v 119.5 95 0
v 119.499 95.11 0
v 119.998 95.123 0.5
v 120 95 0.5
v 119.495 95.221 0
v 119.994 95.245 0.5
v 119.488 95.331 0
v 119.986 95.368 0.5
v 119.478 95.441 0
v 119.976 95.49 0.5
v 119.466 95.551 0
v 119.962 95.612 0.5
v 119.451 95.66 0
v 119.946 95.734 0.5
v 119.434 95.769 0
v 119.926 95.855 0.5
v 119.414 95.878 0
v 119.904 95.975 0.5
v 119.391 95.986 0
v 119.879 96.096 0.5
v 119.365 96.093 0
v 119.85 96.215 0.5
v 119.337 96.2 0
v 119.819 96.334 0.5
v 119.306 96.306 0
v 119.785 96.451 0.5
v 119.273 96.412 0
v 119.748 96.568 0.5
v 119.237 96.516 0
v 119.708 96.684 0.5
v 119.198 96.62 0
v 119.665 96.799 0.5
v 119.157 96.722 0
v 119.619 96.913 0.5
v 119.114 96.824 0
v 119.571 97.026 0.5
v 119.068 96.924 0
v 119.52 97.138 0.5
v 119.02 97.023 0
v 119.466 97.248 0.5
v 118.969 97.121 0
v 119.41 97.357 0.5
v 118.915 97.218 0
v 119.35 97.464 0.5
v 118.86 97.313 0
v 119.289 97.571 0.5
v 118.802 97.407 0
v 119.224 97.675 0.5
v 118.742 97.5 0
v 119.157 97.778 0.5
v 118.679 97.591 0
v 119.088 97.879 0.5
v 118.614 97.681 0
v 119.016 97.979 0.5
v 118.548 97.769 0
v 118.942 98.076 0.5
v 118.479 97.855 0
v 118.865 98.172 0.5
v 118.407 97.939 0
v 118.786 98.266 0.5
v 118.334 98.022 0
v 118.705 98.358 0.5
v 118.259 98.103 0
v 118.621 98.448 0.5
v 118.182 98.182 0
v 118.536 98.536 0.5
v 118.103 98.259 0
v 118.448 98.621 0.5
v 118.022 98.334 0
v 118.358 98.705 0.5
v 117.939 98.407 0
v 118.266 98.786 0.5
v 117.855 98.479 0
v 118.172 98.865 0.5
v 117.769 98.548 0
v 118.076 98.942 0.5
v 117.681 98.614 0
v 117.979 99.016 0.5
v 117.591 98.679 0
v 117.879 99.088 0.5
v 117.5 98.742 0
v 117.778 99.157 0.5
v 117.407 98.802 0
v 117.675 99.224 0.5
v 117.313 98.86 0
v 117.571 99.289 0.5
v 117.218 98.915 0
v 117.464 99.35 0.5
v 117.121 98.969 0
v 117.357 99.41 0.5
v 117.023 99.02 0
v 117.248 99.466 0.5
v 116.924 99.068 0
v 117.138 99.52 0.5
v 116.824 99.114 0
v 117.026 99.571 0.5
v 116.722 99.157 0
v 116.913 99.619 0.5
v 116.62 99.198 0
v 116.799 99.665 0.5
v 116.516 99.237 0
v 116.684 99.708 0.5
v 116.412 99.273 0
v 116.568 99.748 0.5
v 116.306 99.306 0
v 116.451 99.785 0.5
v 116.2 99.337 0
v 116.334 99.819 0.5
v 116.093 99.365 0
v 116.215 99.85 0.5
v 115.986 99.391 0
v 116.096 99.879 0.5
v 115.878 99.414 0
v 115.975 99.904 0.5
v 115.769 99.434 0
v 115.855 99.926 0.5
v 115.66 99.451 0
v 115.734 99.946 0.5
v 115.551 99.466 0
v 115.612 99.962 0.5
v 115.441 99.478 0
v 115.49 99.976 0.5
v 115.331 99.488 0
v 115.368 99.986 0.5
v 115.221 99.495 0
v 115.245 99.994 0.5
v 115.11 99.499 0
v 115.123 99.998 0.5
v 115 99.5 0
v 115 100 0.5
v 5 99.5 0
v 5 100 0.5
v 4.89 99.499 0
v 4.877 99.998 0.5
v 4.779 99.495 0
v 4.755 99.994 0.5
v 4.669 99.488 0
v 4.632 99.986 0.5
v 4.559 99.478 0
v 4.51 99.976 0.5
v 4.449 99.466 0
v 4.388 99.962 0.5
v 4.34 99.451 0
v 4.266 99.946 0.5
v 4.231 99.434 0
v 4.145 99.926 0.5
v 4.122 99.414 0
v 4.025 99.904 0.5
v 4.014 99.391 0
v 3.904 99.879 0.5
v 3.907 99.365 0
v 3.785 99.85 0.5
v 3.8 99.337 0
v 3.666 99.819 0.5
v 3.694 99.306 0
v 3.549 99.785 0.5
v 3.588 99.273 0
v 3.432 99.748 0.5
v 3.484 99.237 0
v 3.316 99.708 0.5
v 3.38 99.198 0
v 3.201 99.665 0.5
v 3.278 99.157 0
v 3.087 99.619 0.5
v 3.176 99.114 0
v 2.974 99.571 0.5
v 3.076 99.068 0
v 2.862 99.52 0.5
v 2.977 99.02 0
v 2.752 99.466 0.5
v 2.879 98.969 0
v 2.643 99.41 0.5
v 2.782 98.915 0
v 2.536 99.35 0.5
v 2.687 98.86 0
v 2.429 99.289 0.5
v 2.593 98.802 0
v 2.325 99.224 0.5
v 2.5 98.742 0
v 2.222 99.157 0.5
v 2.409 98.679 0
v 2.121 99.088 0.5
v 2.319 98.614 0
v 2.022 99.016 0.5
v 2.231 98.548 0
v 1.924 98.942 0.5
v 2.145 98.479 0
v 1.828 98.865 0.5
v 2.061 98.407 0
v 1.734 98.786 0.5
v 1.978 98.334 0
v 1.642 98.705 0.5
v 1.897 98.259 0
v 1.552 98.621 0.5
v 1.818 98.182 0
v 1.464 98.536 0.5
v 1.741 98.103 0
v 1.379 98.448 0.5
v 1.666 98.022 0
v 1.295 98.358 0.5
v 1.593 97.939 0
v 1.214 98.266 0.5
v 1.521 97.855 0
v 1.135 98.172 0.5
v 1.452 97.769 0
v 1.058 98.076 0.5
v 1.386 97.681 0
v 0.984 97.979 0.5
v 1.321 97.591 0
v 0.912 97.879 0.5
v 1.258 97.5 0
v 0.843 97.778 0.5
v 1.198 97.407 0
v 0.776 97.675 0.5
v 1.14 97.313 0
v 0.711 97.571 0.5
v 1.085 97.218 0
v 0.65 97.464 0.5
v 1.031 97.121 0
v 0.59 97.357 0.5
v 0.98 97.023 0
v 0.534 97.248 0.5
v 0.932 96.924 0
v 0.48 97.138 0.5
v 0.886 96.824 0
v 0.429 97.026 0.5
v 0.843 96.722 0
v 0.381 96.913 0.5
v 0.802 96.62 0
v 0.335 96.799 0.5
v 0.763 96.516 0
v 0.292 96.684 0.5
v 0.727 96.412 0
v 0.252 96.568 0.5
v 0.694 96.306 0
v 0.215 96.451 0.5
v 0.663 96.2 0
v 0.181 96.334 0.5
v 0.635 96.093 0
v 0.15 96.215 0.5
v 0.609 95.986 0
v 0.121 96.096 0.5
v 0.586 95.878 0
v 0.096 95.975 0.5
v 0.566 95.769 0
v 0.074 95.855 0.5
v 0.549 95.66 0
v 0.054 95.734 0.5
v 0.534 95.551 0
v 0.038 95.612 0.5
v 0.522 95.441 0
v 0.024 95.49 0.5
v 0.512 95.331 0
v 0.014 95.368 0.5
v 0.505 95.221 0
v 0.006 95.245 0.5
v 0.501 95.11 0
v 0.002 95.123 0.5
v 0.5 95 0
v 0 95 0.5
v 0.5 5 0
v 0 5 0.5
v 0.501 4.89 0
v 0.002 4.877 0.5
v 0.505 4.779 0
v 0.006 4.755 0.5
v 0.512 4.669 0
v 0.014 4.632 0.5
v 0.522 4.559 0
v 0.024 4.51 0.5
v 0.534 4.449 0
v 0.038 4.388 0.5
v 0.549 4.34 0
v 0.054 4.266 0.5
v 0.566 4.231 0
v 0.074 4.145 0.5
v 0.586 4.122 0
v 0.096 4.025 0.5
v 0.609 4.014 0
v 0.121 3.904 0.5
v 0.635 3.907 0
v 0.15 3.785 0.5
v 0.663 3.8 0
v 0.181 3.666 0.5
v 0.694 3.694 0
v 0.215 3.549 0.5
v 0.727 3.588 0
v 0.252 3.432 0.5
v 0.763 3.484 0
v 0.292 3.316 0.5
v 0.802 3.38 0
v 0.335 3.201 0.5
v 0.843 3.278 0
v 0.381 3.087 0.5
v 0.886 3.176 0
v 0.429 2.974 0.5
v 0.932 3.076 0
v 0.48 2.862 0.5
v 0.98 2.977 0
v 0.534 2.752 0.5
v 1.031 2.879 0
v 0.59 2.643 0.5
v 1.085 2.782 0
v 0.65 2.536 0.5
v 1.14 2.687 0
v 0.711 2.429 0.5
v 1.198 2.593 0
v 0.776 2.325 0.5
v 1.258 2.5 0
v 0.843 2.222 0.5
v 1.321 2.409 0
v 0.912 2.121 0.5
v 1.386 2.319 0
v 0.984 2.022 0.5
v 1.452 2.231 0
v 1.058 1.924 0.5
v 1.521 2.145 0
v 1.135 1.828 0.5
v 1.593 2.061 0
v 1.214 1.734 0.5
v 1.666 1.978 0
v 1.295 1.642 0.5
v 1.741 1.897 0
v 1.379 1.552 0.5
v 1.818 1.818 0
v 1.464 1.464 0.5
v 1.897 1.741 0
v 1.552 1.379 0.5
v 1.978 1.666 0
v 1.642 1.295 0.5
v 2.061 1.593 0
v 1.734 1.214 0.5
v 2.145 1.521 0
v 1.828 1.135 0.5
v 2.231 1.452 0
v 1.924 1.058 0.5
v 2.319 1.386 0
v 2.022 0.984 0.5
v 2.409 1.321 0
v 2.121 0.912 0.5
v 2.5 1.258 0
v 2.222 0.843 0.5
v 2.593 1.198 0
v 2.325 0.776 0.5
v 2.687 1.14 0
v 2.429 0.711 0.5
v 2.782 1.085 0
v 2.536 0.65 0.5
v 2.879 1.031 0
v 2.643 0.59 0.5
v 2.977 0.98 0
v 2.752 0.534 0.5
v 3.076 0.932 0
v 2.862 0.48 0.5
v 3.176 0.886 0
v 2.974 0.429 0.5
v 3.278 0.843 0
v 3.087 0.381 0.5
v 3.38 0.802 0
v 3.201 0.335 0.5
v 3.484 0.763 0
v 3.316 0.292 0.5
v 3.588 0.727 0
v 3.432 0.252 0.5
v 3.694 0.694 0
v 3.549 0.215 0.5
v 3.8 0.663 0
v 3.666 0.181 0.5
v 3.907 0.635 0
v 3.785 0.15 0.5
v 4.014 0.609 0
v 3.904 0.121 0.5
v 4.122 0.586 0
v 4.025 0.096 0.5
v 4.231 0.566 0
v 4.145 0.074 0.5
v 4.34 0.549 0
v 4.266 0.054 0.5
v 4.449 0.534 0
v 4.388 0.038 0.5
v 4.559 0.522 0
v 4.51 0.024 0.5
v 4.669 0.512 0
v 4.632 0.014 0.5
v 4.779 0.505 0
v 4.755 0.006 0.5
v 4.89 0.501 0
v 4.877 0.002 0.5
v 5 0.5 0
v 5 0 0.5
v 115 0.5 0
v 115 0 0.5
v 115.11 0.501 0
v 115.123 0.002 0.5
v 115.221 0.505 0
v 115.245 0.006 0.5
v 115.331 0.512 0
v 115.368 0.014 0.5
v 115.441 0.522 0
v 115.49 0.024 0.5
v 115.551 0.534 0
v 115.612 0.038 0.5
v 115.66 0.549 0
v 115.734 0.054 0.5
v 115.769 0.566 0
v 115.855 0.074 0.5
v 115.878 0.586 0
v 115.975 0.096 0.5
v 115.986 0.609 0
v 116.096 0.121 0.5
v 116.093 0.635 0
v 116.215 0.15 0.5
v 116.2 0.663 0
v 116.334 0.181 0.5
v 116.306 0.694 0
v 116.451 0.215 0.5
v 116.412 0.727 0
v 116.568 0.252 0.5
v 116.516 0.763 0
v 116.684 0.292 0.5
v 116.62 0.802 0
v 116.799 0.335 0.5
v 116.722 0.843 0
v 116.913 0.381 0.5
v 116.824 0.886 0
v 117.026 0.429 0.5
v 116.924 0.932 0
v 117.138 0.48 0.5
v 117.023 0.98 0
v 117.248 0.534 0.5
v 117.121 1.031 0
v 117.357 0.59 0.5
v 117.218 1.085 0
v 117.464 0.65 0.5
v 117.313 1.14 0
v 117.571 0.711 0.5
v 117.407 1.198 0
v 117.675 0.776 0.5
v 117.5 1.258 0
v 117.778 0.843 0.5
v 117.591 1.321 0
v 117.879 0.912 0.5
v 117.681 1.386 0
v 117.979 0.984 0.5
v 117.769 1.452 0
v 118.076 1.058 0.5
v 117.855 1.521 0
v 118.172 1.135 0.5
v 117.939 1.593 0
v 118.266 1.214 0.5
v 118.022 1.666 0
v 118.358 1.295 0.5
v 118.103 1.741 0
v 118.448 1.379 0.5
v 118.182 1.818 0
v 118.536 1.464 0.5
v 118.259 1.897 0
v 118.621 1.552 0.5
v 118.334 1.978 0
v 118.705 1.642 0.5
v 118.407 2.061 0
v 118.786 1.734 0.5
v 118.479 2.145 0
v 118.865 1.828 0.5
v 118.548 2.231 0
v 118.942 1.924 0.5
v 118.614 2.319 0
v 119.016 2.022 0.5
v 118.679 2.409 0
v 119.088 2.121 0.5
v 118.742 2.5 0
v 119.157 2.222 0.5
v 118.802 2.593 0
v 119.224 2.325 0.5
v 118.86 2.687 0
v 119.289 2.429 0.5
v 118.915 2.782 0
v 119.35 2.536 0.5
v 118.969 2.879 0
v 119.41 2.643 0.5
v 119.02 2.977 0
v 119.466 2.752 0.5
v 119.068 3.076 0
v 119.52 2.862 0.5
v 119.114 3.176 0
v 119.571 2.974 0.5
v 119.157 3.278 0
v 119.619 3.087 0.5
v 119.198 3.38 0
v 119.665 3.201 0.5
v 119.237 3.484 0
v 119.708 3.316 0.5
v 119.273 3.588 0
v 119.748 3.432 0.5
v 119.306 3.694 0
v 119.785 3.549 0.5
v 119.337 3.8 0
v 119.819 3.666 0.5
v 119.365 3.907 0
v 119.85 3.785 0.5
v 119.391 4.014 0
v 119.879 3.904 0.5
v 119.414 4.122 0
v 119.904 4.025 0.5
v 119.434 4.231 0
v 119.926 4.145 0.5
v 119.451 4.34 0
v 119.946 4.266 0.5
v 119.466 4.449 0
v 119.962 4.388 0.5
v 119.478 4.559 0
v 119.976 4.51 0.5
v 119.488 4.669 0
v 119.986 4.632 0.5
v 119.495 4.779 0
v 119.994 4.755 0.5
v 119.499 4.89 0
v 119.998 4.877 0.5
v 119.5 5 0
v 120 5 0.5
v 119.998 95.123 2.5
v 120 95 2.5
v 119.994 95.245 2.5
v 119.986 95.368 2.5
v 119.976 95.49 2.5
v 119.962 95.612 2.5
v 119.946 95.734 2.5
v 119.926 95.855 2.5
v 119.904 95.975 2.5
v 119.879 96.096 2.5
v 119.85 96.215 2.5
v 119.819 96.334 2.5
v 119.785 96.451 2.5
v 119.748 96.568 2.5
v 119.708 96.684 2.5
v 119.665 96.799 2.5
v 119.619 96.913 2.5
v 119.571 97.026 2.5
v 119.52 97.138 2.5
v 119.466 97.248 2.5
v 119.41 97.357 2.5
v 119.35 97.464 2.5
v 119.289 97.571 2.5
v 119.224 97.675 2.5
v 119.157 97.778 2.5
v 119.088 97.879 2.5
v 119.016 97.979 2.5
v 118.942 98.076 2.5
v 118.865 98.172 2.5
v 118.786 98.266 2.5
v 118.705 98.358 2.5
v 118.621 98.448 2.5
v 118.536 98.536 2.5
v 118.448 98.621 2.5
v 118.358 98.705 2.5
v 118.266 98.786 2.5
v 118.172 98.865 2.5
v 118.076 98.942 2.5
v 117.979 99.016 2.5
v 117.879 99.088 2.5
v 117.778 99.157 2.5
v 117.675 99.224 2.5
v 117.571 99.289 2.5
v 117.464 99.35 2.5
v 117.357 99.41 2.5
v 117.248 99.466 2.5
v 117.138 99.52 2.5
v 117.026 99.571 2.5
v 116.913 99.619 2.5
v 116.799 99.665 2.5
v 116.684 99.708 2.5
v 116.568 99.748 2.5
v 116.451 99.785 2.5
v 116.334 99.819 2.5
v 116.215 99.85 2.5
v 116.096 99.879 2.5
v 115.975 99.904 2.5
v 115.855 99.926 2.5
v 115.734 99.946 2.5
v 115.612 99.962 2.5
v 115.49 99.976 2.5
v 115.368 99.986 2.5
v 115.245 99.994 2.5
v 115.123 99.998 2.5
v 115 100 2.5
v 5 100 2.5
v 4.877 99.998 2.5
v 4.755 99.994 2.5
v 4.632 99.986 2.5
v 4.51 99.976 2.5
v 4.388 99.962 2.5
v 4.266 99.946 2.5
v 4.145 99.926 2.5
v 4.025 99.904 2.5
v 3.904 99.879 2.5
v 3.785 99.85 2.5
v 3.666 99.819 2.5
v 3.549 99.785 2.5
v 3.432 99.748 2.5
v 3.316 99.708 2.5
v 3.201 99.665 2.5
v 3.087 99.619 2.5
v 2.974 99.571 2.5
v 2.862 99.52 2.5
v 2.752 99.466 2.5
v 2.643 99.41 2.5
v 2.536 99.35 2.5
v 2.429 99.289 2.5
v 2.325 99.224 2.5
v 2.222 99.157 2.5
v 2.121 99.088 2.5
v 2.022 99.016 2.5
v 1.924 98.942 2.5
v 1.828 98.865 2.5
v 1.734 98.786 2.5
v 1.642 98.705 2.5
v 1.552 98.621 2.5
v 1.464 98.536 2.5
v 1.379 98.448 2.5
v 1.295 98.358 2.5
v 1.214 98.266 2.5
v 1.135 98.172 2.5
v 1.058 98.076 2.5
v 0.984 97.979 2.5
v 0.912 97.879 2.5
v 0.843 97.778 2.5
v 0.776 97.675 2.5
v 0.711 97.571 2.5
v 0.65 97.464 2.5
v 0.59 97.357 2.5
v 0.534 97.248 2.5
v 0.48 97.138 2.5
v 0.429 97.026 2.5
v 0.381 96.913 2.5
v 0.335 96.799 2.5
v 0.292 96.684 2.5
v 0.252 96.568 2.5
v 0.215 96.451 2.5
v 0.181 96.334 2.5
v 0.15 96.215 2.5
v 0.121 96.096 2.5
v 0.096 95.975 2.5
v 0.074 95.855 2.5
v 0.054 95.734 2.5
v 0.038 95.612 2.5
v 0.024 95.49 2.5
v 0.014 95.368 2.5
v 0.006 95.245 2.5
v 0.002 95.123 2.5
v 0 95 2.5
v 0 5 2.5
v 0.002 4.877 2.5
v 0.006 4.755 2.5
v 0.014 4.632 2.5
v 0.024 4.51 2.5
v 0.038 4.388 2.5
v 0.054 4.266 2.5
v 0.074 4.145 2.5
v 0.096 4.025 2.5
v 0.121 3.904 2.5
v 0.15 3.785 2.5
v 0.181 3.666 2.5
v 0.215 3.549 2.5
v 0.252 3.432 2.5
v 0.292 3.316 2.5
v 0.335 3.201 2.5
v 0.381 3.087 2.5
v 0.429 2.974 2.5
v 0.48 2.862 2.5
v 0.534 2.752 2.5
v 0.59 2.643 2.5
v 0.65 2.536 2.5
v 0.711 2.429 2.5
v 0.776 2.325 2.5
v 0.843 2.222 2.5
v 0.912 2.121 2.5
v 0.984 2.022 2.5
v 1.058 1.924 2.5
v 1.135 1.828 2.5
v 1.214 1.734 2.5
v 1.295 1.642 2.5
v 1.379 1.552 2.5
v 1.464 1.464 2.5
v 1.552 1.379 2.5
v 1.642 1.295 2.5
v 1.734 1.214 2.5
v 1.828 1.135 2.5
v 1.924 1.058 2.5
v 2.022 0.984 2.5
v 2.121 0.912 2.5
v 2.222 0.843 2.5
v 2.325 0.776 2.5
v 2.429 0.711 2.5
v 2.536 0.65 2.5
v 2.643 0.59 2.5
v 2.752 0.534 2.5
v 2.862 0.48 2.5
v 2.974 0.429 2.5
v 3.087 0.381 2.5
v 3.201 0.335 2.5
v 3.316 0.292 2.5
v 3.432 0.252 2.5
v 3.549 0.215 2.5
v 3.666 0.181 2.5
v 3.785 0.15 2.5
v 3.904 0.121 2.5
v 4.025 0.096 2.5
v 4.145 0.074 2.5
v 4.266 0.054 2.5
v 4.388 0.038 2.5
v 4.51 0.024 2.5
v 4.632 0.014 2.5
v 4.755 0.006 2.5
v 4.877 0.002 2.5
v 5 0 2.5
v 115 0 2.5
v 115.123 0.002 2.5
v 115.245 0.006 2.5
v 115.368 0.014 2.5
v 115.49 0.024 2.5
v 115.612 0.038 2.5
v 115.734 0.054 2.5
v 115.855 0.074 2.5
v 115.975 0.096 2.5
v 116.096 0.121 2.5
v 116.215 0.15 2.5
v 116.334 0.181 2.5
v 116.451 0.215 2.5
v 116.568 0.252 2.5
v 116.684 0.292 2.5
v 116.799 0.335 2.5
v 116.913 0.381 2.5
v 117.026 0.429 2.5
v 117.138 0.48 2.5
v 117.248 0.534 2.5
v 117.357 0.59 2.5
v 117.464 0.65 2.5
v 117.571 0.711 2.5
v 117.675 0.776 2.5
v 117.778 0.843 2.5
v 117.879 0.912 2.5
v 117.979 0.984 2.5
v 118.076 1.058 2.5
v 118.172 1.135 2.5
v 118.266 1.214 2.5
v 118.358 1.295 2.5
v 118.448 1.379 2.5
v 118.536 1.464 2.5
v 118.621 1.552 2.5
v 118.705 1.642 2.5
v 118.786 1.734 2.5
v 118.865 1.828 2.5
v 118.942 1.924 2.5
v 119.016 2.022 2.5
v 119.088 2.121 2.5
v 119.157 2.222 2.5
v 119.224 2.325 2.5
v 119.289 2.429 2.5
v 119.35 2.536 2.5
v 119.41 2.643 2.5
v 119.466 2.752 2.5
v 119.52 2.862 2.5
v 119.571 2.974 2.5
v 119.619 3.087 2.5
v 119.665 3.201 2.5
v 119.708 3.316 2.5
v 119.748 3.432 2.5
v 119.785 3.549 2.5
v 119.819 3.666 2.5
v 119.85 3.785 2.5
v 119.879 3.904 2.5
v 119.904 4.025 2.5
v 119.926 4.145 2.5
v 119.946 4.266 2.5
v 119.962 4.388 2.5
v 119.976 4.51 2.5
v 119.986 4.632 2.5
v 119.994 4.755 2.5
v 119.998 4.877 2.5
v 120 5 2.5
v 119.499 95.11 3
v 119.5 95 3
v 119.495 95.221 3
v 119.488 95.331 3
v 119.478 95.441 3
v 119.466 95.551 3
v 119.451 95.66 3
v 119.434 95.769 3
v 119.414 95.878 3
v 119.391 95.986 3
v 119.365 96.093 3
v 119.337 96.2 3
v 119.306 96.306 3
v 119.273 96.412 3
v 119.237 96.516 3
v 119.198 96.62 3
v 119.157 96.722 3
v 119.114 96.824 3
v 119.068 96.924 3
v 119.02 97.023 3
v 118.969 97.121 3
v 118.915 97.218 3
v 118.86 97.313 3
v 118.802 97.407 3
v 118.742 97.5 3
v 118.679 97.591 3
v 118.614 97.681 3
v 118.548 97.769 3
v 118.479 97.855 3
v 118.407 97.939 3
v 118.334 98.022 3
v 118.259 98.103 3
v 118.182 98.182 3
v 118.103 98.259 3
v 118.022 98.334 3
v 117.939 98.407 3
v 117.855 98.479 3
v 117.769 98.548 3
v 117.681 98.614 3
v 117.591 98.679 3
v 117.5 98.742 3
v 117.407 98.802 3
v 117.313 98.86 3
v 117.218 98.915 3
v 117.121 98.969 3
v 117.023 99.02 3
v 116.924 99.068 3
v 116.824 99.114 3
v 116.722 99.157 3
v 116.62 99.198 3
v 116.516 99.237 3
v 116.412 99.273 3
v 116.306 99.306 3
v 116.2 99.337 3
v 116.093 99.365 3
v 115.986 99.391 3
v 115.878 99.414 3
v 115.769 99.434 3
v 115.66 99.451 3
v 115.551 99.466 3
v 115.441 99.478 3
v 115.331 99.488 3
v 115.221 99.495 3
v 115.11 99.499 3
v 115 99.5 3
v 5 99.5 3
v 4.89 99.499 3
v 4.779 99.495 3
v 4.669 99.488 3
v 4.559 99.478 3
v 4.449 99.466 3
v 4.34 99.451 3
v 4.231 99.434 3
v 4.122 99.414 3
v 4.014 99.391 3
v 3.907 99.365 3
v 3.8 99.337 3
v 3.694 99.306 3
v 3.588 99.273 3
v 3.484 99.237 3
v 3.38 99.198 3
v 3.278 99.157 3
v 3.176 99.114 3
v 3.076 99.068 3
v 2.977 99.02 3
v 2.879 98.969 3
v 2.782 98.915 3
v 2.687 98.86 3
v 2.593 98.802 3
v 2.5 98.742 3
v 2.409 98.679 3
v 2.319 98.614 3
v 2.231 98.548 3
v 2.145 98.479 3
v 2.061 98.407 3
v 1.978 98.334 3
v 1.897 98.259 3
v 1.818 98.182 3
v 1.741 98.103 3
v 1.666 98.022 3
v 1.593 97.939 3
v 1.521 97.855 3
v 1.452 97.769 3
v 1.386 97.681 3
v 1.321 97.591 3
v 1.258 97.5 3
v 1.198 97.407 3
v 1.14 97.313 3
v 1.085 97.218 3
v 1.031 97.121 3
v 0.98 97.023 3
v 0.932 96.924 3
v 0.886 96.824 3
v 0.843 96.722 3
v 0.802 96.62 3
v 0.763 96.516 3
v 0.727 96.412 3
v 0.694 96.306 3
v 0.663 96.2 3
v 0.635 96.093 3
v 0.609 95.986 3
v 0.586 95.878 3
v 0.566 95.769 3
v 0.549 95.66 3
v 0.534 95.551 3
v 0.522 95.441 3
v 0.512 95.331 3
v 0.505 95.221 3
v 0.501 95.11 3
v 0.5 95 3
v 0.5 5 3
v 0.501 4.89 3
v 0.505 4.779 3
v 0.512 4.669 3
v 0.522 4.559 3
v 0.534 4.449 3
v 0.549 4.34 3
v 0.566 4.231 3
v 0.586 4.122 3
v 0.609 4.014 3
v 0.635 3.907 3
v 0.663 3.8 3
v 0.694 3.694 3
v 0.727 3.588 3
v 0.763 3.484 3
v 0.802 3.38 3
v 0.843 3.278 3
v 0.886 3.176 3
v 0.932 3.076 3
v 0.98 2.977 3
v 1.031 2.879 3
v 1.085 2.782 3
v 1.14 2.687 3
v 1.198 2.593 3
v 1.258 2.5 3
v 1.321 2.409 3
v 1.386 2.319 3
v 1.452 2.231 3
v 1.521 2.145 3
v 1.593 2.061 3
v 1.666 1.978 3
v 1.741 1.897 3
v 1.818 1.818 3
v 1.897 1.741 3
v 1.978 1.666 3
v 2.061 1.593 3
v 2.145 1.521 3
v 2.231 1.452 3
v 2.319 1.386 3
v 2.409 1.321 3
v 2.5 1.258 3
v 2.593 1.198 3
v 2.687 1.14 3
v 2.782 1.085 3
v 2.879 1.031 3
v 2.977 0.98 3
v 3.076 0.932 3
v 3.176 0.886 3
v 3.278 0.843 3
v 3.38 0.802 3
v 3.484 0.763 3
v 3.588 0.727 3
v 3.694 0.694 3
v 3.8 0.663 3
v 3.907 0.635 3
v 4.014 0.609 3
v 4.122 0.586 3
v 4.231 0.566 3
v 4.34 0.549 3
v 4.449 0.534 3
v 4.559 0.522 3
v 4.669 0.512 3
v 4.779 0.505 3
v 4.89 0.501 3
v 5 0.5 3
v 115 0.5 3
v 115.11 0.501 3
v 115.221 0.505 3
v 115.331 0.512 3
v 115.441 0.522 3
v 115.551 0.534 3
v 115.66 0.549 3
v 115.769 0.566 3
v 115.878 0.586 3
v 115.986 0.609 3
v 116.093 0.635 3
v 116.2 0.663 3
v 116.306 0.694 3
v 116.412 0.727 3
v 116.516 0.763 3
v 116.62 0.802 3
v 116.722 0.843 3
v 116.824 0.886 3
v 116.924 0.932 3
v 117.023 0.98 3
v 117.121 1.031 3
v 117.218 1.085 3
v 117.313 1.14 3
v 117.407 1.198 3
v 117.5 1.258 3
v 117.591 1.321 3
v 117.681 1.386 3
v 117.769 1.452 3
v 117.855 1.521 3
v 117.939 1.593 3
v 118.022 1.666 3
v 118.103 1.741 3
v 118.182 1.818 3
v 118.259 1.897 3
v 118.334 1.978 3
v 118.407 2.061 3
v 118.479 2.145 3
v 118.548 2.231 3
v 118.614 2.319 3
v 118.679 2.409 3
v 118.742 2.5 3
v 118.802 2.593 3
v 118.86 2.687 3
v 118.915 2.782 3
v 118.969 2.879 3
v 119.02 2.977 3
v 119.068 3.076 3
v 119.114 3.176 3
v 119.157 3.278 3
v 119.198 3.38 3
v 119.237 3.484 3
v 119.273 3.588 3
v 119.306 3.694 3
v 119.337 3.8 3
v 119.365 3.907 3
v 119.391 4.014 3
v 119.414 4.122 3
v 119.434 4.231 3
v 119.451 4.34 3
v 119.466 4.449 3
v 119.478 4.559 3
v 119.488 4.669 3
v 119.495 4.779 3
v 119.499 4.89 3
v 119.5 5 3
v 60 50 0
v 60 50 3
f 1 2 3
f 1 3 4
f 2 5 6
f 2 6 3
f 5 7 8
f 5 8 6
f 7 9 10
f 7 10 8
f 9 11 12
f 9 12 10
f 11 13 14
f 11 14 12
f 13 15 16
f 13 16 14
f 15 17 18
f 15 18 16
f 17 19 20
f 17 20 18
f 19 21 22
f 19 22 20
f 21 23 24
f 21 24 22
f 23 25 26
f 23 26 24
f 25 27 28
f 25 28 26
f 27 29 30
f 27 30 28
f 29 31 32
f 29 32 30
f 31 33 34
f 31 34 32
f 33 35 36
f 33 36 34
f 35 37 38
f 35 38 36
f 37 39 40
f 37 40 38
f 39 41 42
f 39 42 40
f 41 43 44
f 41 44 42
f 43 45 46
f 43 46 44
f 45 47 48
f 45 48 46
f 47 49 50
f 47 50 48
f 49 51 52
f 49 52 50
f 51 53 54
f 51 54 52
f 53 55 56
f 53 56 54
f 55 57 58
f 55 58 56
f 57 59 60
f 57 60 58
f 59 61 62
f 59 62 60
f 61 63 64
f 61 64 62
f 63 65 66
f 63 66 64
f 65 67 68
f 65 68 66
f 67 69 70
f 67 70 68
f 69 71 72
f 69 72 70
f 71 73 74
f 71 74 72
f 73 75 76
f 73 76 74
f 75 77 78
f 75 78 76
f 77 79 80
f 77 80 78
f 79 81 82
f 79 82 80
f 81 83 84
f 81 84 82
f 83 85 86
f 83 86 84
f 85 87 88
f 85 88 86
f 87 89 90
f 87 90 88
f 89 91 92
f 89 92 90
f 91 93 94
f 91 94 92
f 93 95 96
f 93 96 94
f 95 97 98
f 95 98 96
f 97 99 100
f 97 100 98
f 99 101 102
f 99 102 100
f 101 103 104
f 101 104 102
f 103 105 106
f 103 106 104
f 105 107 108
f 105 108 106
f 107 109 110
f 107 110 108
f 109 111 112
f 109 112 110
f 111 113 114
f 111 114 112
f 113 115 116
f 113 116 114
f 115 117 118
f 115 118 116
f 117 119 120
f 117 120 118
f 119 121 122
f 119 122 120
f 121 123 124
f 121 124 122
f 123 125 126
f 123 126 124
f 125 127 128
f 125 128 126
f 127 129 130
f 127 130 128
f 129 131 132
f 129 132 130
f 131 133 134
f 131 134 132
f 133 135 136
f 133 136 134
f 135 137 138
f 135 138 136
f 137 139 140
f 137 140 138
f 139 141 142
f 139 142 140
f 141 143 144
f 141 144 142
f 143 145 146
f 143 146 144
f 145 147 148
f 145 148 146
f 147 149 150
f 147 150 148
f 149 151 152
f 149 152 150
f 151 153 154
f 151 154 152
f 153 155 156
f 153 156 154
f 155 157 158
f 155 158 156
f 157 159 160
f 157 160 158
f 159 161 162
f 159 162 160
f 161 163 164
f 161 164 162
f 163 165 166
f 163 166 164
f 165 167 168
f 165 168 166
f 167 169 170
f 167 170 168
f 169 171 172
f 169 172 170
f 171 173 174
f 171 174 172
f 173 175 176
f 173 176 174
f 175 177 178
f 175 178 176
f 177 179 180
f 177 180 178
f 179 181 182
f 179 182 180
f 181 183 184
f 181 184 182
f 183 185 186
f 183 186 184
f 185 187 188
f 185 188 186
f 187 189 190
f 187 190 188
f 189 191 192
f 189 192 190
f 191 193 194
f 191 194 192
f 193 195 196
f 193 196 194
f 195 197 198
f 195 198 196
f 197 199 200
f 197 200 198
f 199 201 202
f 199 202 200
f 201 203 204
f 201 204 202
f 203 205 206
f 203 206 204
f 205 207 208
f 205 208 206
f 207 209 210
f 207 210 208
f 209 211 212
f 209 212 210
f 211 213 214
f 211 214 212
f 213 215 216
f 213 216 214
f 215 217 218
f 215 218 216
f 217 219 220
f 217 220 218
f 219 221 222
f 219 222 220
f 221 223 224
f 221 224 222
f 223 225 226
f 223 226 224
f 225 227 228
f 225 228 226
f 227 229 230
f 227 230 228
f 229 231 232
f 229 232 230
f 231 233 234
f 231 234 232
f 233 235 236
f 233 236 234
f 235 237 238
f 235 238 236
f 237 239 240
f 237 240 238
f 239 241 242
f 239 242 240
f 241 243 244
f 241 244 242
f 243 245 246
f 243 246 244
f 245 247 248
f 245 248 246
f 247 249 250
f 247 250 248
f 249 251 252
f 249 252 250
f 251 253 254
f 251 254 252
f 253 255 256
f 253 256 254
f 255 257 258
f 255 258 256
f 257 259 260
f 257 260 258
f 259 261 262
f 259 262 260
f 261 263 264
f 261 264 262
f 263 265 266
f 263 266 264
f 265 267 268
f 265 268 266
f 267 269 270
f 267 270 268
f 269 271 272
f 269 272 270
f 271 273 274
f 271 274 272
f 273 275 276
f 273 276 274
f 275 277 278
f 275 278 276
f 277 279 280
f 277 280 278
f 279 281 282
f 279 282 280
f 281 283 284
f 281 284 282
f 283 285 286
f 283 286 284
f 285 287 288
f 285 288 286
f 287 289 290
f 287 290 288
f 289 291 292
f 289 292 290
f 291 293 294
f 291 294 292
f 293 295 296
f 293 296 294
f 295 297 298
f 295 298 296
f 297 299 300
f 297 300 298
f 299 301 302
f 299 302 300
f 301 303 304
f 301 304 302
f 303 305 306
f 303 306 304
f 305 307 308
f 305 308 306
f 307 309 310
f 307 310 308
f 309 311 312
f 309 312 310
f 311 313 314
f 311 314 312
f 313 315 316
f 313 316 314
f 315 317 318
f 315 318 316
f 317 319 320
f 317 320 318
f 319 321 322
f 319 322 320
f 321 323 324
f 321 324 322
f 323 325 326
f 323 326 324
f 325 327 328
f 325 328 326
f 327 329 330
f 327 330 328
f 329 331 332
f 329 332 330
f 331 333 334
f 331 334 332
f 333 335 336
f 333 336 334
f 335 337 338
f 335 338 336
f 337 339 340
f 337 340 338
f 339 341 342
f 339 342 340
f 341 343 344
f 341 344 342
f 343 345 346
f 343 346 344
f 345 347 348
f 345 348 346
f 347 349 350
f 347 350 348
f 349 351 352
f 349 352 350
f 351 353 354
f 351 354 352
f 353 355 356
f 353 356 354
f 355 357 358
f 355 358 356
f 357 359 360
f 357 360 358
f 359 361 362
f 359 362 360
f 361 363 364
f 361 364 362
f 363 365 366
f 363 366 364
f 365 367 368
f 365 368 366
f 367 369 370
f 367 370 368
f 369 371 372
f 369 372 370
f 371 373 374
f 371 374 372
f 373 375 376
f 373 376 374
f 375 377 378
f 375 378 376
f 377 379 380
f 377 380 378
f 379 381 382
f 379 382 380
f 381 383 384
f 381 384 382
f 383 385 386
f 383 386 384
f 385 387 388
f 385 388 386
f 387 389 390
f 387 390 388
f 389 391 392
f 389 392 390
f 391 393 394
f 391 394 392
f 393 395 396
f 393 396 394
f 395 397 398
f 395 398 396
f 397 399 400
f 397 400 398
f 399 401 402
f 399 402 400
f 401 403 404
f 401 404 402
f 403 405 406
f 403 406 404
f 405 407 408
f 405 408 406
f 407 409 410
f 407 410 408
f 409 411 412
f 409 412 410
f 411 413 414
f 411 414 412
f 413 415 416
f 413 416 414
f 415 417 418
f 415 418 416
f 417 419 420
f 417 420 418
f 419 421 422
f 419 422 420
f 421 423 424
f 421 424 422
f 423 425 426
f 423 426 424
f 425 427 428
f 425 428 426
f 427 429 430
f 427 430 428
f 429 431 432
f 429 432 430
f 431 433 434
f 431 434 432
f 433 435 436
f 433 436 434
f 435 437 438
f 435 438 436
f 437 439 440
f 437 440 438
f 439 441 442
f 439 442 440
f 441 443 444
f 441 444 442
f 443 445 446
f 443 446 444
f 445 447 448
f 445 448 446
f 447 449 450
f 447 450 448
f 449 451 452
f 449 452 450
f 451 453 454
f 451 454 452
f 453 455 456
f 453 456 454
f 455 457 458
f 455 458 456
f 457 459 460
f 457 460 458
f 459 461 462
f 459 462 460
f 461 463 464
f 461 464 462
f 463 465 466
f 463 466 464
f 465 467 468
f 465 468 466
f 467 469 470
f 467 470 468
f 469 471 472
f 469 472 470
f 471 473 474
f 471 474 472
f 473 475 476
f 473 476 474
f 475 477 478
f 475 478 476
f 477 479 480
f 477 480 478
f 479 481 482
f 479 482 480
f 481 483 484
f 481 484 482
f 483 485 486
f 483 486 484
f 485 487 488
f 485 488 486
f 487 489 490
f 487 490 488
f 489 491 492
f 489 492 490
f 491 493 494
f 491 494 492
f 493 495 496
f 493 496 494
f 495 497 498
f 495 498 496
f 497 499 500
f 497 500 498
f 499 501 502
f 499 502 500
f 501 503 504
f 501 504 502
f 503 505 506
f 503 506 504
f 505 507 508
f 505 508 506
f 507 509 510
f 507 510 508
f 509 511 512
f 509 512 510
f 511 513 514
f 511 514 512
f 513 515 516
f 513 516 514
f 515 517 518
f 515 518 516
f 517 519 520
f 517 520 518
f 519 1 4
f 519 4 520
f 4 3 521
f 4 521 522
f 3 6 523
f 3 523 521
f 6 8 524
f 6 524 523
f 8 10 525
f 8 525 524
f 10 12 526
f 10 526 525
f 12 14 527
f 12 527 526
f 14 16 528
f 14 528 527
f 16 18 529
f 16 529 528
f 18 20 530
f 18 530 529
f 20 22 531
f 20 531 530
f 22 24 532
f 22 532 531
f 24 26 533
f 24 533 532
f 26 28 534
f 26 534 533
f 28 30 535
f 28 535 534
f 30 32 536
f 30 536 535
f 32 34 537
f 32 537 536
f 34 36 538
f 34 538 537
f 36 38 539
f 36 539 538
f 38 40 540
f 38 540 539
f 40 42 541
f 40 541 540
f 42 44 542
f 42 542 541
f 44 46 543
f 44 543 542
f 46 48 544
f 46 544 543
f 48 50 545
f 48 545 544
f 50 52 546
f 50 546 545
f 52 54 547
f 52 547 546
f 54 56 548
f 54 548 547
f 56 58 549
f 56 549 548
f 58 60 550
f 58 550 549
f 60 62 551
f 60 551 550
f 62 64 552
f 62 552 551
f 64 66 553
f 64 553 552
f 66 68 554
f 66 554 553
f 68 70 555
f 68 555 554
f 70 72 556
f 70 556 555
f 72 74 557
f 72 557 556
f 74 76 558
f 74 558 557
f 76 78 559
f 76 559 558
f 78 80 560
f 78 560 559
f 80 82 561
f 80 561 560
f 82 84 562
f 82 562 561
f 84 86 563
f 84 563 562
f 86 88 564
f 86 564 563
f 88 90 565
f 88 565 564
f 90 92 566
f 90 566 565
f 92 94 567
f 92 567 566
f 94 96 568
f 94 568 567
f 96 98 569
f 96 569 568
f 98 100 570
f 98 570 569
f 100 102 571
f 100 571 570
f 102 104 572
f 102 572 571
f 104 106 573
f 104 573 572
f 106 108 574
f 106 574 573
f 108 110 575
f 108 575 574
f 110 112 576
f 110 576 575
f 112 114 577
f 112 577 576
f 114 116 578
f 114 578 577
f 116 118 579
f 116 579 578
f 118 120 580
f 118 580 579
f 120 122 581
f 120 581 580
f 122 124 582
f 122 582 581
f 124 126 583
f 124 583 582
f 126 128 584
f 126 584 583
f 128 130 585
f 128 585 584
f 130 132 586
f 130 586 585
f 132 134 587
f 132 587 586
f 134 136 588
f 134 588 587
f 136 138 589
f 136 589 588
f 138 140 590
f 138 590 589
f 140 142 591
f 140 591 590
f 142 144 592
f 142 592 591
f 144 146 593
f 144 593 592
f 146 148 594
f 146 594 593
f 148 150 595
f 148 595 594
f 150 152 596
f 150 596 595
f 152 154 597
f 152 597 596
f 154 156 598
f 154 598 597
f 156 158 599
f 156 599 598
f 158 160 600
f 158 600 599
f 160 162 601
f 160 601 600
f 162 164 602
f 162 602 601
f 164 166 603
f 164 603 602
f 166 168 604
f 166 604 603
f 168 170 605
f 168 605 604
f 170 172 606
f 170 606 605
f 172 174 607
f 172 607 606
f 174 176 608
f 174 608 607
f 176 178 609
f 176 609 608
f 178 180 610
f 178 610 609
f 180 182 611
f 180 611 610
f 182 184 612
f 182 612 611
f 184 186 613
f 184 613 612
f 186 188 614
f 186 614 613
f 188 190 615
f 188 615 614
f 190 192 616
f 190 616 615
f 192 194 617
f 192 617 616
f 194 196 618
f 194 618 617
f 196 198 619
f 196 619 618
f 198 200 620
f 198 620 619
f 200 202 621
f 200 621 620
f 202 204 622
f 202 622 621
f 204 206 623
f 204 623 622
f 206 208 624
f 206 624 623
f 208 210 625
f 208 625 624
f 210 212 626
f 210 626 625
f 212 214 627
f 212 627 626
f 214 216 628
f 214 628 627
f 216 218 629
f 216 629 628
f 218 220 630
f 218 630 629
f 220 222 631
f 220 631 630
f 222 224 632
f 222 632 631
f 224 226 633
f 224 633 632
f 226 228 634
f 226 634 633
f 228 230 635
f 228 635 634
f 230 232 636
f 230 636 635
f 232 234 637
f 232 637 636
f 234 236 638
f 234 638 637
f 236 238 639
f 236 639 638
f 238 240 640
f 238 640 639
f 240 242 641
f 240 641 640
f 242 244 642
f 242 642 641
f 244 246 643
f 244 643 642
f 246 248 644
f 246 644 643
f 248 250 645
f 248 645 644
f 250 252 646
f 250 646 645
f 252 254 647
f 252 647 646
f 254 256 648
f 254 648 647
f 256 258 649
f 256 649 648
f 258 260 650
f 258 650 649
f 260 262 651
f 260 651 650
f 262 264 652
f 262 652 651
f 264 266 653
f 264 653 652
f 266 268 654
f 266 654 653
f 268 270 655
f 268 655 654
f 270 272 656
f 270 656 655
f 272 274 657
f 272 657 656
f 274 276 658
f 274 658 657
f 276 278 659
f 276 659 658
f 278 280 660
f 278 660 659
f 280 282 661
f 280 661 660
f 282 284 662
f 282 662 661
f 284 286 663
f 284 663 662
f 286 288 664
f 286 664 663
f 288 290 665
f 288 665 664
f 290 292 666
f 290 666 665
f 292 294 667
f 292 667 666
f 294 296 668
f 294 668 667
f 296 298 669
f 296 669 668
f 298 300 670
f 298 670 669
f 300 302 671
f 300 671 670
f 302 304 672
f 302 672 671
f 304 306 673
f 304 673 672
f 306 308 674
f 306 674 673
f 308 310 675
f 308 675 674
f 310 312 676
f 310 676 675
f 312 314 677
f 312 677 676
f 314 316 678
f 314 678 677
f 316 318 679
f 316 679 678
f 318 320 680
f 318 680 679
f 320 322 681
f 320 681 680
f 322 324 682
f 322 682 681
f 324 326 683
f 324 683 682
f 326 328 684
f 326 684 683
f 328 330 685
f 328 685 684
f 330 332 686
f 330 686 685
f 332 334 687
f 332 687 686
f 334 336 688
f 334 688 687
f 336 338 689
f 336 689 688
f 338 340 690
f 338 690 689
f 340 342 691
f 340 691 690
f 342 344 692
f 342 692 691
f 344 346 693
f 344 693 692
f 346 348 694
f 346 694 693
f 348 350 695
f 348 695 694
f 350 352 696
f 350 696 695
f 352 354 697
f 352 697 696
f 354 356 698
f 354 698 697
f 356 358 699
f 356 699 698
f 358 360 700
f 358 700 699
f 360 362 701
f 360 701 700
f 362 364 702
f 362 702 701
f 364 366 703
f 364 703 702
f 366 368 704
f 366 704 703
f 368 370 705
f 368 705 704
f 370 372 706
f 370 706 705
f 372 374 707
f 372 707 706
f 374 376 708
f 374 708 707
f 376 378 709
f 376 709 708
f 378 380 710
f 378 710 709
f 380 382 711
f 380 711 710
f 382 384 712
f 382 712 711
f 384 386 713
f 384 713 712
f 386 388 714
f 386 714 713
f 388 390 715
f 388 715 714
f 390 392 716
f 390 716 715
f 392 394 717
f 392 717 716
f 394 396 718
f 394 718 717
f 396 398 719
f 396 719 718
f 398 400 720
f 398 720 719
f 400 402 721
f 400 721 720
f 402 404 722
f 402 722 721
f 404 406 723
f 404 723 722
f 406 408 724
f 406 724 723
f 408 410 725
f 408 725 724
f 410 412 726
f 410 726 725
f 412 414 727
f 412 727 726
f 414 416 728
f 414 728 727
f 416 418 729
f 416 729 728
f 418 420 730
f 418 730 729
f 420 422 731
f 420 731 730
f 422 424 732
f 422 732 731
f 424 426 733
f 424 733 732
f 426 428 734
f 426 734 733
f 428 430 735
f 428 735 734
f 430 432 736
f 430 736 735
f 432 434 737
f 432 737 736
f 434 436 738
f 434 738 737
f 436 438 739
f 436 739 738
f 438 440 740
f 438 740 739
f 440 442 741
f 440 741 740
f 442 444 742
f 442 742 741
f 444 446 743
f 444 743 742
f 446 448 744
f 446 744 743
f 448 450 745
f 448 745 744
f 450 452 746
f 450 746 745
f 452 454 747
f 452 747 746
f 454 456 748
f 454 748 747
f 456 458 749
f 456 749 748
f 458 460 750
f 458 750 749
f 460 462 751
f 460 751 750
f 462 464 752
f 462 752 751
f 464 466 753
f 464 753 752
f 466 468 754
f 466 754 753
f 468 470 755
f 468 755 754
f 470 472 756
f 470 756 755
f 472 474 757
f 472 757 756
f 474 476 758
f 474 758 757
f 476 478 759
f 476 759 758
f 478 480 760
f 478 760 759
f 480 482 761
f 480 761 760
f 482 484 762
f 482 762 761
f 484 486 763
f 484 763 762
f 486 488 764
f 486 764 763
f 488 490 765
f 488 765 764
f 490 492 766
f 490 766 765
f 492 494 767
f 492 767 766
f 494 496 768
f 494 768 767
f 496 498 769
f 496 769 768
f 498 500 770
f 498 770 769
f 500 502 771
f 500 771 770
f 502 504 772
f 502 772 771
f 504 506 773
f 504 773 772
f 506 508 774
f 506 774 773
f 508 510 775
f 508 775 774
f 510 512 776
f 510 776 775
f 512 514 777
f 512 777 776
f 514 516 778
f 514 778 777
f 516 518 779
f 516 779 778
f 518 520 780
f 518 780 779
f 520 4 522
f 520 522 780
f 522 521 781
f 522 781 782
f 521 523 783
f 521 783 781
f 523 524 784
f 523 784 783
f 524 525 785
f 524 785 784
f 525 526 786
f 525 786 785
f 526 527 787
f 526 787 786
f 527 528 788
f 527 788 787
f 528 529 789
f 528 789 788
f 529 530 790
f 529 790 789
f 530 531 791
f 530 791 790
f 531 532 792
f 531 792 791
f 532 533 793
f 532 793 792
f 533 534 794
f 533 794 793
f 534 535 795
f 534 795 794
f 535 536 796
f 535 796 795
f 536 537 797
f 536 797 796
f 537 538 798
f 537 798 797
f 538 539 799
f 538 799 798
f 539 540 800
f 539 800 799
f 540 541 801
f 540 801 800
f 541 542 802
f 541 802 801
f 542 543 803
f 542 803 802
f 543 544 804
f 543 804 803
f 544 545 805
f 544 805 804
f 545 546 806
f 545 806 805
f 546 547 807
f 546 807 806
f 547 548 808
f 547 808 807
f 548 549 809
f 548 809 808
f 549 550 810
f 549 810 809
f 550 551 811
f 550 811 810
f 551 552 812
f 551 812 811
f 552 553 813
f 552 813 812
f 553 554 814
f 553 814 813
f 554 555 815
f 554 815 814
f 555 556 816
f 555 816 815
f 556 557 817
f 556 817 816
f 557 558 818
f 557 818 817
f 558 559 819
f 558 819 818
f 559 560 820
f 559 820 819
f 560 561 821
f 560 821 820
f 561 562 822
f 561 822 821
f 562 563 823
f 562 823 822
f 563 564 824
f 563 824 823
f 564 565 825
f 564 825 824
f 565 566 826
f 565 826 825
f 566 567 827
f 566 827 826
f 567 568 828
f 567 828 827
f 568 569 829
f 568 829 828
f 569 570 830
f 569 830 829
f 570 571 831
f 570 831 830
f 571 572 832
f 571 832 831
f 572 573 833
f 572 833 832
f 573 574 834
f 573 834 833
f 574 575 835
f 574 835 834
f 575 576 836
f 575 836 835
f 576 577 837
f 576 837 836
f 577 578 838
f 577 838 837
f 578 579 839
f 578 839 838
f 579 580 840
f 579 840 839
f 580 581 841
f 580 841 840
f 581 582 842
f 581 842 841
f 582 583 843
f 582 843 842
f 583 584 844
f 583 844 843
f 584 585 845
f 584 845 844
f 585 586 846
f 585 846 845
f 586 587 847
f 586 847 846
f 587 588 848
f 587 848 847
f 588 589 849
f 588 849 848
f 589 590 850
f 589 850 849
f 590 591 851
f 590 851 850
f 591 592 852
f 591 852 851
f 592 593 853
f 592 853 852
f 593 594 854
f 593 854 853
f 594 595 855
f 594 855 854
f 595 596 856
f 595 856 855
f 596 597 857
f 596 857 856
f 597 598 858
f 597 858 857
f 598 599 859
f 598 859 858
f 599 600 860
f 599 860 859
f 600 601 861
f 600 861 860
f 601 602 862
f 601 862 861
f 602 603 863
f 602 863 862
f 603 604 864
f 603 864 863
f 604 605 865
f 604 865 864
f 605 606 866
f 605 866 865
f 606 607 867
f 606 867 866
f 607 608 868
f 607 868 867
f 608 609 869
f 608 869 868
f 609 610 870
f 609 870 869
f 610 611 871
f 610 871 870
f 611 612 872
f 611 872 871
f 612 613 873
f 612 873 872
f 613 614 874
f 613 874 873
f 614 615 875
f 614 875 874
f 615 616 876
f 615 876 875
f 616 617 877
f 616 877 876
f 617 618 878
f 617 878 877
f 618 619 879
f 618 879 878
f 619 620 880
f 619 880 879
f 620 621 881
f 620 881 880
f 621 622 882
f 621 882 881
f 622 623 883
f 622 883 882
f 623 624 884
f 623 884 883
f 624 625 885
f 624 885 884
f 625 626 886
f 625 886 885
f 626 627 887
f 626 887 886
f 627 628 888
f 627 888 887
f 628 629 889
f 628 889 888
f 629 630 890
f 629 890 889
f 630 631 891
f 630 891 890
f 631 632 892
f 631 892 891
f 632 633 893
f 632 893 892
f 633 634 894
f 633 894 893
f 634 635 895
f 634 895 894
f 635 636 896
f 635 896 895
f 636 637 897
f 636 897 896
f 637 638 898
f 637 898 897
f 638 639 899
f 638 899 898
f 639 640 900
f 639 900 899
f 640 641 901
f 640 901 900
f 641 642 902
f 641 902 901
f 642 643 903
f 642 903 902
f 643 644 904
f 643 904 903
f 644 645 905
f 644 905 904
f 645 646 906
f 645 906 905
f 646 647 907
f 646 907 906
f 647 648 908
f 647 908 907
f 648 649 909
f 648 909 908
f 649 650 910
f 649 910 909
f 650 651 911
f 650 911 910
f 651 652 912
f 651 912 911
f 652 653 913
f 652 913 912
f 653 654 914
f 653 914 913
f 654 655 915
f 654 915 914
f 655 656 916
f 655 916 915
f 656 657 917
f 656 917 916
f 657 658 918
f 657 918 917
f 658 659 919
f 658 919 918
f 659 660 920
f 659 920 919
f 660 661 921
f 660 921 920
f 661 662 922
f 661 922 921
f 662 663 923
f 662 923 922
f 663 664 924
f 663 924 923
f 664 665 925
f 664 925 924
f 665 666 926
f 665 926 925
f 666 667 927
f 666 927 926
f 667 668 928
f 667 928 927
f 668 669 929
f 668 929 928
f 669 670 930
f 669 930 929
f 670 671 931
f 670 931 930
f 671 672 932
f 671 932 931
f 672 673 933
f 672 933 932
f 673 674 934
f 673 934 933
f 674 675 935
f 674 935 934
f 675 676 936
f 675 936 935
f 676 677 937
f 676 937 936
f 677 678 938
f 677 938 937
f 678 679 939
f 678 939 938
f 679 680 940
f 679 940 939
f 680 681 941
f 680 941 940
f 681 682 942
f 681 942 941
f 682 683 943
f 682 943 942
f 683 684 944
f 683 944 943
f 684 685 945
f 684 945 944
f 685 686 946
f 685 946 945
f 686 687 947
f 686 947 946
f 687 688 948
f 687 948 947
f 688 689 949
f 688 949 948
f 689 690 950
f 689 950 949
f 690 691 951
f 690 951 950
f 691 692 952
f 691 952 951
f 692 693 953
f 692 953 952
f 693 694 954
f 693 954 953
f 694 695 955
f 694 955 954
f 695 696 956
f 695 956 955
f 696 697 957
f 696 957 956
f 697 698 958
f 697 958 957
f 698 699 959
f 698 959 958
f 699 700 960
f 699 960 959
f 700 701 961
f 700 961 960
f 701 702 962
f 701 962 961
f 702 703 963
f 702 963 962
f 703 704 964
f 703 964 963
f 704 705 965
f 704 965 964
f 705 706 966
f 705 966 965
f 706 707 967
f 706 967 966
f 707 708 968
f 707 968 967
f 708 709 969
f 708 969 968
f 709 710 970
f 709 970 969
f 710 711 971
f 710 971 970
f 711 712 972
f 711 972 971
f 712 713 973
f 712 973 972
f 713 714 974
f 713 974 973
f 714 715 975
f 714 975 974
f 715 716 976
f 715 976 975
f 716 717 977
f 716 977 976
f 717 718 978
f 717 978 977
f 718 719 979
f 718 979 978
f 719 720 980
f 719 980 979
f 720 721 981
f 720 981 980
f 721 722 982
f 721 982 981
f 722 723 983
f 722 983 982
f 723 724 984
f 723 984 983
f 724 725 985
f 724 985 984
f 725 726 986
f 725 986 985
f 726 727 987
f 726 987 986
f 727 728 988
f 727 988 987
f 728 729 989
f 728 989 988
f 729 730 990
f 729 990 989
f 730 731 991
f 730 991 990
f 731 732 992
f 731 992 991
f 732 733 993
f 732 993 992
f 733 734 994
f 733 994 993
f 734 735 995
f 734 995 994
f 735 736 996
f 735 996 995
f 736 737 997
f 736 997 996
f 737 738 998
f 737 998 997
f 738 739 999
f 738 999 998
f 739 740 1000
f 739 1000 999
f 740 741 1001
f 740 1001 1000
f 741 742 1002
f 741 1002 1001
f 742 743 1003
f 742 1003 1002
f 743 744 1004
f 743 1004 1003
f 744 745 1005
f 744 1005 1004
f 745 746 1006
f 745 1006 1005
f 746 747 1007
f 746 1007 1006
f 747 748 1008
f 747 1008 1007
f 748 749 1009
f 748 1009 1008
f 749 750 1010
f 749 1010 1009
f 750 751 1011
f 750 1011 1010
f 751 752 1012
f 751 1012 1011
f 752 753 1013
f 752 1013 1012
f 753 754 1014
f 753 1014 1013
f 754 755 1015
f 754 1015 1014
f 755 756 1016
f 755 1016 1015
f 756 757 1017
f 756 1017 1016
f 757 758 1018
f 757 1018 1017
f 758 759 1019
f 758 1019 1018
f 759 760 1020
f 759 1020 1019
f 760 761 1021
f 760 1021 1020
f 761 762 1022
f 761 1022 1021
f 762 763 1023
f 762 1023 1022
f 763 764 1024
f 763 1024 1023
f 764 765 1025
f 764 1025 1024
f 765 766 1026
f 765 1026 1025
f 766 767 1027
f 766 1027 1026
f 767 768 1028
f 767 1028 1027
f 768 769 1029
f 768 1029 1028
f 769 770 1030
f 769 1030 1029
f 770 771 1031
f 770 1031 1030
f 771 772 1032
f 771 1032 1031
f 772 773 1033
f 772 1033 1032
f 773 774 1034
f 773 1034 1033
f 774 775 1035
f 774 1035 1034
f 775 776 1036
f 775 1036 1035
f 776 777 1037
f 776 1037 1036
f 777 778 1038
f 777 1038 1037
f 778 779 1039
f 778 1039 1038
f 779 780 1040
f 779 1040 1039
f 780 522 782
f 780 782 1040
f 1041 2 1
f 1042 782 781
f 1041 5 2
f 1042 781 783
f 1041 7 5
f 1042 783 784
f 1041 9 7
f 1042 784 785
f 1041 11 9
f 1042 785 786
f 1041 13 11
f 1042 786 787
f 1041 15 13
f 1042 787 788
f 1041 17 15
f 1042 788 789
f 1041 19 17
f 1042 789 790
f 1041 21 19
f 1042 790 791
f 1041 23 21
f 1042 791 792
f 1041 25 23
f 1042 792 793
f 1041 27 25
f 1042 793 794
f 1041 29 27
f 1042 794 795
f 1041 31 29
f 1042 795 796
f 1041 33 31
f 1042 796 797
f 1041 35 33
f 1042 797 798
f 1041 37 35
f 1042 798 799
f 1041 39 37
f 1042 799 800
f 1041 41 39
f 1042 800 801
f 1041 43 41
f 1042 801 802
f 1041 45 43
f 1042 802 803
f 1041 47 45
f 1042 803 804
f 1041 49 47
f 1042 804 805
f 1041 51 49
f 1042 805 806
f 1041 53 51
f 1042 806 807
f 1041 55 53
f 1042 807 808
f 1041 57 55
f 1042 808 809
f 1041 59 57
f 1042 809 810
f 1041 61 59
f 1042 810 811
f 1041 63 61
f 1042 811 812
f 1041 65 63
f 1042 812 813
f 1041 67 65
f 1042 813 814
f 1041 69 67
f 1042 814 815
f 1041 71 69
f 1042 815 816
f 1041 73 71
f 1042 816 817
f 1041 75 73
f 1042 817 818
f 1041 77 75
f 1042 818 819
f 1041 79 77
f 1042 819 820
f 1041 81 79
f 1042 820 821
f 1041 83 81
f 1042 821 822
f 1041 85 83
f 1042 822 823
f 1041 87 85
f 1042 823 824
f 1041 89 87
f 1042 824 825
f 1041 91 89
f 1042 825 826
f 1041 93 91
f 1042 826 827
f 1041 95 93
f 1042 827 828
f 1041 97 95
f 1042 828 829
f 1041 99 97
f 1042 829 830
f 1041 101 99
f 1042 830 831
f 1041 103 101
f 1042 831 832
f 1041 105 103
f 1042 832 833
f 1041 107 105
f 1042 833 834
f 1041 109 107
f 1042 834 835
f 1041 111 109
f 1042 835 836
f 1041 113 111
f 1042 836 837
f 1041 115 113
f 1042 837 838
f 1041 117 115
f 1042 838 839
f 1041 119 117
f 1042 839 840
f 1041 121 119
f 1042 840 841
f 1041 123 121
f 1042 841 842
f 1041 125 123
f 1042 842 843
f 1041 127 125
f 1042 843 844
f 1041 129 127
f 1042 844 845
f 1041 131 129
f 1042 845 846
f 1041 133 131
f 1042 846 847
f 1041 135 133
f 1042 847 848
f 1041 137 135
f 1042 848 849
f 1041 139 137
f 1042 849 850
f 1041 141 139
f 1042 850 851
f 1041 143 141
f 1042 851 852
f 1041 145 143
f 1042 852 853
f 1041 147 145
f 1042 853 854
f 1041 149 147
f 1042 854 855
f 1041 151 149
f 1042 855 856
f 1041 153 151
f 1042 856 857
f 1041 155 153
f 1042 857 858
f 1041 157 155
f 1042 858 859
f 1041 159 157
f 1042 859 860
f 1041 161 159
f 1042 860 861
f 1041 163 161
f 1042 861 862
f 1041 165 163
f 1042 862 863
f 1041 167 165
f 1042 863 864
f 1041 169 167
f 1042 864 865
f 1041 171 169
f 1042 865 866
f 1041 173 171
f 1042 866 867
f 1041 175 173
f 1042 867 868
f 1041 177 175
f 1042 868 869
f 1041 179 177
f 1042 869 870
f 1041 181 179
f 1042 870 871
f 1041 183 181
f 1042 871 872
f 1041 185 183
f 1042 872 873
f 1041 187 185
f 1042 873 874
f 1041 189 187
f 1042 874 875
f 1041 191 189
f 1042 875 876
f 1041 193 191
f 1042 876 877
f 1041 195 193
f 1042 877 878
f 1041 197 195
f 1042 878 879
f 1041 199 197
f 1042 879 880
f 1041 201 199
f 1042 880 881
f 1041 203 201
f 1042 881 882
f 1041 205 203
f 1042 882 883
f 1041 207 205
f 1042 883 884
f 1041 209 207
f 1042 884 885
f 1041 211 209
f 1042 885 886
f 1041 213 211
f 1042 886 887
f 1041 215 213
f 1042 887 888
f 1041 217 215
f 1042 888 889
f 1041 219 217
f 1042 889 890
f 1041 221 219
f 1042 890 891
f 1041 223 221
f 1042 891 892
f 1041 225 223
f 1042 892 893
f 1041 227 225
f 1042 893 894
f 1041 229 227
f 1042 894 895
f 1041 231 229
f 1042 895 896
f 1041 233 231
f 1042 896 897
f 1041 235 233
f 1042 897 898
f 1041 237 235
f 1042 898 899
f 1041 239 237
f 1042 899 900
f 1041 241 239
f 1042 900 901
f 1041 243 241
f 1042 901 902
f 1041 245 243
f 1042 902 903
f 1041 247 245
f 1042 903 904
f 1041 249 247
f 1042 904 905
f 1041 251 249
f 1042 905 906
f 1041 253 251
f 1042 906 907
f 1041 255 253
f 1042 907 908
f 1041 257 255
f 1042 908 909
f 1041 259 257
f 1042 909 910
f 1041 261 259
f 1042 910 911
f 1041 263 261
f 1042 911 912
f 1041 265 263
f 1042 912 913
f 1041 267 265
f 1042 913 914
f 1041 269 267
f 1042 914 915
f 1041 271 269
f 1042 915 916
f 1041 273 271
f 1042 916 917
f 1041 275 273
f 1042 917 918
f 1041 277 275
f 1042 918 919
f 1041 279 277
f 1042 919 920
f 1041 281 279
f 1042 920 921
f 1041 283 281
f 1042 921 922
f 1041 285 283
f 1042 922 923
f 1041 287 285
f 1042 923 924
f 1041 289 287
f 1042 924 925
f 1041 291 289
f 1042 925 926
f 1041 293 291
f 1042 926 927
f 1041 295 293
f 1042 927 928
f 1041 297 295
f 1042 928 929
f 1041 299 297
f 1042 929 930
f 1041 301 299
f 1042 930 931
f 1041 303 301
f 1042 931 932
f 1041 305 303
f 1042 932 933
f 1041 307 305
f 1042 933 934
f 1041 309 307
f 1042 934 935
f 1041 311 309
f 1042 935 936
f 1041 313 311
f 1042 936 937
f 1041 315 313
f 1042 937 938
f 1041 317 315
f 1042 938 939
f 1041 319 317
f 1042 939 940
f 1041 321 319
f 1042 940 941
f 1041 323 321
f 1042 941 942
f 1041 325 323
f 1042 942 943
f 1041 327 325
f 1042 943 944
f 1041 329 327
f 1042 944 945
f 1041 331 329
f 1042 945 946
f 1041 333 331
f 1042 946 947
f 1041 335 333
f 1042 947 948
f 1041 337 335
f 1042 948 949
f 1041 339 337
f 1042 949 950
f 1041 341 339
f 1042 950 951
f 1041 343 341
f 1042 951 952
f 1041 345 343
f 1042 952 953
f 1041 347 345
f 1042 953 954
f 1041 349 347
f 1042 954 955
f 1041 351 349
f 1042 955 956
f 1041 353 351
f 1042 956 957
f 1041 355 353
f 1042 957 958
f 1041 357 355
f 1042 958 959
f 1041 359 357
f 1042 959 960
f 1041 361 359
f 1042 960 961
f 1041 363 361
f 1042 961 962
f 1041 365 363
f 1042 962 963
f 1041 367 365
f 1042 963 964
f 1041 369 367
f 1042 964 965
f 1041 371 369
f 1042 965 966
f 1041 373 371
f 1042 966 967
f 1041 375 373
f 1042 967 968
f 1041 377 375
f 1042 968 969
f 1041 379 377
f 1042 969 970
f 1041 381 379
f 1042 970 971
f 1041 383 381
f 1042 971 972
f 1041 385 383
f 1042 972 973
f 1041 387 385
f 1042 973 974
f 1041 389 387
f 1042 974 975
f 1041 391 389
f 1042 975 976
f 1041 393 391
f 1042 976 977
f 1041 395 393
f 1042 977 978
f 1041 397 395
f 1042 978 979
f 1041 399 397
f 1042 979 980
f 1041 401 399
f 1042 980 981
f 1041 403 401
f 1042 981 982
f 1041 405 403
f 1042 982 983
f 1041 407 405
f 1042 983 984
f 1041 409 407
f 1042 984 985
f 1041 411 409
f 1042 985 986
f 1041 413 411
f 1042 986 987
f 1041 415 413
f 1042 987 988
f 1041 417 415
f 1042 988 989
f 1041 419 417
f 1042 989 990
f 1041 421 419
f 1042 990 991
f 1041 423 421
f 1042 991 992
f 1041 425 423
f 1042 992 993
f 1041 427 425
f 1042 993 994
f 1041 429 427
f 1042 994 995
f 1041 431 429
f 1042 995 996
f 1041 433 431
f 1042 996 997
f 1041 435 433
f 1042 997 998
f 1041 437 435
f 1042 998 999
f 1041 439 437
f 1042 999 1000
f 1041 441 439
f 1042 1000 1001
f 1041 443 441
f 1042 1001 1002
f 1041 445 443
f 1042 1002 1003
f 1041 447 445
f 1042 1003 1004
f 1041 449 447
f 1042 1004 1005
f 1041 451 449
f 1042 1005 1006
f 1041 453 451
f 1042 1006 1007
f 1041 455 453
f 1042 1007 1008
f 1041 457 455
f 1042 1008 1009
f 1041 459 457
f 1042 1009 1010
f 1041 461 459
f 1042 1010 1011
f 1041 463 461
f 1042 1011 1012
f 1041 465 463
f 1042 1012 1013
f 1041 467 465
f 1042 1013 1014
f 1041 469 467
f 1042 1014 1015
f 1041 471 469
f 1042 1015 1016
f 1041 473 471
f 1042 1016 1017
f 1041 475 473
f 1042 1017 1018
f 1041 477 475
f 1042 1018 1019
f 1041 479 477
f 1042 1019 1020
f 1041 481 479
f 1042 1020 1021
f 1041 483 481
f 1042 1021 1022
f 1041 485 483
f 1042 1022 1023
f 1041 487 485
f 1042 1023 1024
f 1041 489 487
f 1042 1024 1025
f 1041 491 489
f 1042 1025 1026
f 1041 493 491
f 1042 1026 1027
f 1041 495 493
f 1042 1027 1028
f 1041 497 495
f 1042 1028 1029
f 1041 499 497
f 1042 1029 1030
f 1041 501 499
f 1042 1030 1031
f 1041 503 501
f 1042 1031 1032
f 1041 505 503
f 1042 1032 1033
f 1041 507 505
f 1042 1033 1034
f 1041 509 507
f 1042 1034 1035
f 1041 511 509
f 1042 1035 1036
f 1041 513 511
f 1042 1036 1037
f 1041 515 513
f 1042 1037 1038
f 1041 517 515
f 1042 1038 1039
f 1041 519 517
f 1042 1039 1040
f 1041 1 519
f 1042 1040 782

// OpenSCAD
// mm. R: plan-view corner radius. C: 45-degree top/bottom edge bevel.
length=120; width=100; thickness=3;
radius=5; bevel=0.5;
round_plate=false;
assert(min(length,width,thickness)>0);
assert(radius>=0 && radius<=min(length,width)/2);
assert(bevel>=0 && bevel<min(length,width,thickness)/2);
function ring(z,d)=round_plate ?
    [for(i=[0:255]) [length/2+(length/2-d)*cos(i*360/256),width/2+(width/2-d)*sin(i*360/256),z]] :
    let(r=max(0,radius-d), centers=[[length-d-r,width-d-r],[d+r,width-d-r],[d+r,d+r],[length-d-r,d+r]])
    [for(j=[0:3]) for(i=[0:64]) [centers[j][0]+r*cos(j*90+i*90/64),centers[j][1]+r*sin(j*90+i*90/64),z]];
rings=bevel==0?[[0,0],[thickness,0]]:
    (!round_plate && radius>0 && radius<bevel)?
    [[0,bevel],[bevel-radius,radius],[bevel,0],[thickness-bevel,0],[thickness-bevel+radius,radius],[thickness,bevel]]:
    [[0,bevel],[bevel,0],[thickness-bevel,0],[thickness,bevel]];
n=round_plate?256:260; nr=len(rings);
v=concat([for(pair=rings) each ring(pair[0],pair[1])],[[length/2,width/2,0],[length/2,width/2,thickness]]);
faces=concat(
 [for(j=[0:nr-2]) for(i=[0:n-1]) each [[j*n+i,j*n+(i+1)%n,(j+1)*n+(i+1)%n],[j*n+i,(j+1)*n+(i+1)%n,(j+1)*n+i]]],
 [for(i=[0:n-1]) each [[nr*n,(i+1)%n,i],[nr*n+1,(nr-1)*n+i,(nr-1)*n+(i+1)%n]]]);
// Weld collapsed corner vertices when R=0 or C>=R, then drop zero-area faces.
vr=[for(p=v) [for(q=p) round(q*1000000)/1000000]];
unique=[for(i=[0:len(vr)-1]) if(search([vr[i]],vr)[0]==i) vr[i]];
mapped=[for(f=faces) [for(i=f) search([vr[i]],unique)[0]]];
// OpenSCAD uses clockwise face winding viewed from outside.
polyhedron(points=unique,faces=[for(f=mapped)
    if(norm(cross(unique[f[1]]-unique[f[0]],unique[f[2]]-unique[f[0]]))>0.000000001)
    [f[2],f[1],f[0]]],convexity=10);
